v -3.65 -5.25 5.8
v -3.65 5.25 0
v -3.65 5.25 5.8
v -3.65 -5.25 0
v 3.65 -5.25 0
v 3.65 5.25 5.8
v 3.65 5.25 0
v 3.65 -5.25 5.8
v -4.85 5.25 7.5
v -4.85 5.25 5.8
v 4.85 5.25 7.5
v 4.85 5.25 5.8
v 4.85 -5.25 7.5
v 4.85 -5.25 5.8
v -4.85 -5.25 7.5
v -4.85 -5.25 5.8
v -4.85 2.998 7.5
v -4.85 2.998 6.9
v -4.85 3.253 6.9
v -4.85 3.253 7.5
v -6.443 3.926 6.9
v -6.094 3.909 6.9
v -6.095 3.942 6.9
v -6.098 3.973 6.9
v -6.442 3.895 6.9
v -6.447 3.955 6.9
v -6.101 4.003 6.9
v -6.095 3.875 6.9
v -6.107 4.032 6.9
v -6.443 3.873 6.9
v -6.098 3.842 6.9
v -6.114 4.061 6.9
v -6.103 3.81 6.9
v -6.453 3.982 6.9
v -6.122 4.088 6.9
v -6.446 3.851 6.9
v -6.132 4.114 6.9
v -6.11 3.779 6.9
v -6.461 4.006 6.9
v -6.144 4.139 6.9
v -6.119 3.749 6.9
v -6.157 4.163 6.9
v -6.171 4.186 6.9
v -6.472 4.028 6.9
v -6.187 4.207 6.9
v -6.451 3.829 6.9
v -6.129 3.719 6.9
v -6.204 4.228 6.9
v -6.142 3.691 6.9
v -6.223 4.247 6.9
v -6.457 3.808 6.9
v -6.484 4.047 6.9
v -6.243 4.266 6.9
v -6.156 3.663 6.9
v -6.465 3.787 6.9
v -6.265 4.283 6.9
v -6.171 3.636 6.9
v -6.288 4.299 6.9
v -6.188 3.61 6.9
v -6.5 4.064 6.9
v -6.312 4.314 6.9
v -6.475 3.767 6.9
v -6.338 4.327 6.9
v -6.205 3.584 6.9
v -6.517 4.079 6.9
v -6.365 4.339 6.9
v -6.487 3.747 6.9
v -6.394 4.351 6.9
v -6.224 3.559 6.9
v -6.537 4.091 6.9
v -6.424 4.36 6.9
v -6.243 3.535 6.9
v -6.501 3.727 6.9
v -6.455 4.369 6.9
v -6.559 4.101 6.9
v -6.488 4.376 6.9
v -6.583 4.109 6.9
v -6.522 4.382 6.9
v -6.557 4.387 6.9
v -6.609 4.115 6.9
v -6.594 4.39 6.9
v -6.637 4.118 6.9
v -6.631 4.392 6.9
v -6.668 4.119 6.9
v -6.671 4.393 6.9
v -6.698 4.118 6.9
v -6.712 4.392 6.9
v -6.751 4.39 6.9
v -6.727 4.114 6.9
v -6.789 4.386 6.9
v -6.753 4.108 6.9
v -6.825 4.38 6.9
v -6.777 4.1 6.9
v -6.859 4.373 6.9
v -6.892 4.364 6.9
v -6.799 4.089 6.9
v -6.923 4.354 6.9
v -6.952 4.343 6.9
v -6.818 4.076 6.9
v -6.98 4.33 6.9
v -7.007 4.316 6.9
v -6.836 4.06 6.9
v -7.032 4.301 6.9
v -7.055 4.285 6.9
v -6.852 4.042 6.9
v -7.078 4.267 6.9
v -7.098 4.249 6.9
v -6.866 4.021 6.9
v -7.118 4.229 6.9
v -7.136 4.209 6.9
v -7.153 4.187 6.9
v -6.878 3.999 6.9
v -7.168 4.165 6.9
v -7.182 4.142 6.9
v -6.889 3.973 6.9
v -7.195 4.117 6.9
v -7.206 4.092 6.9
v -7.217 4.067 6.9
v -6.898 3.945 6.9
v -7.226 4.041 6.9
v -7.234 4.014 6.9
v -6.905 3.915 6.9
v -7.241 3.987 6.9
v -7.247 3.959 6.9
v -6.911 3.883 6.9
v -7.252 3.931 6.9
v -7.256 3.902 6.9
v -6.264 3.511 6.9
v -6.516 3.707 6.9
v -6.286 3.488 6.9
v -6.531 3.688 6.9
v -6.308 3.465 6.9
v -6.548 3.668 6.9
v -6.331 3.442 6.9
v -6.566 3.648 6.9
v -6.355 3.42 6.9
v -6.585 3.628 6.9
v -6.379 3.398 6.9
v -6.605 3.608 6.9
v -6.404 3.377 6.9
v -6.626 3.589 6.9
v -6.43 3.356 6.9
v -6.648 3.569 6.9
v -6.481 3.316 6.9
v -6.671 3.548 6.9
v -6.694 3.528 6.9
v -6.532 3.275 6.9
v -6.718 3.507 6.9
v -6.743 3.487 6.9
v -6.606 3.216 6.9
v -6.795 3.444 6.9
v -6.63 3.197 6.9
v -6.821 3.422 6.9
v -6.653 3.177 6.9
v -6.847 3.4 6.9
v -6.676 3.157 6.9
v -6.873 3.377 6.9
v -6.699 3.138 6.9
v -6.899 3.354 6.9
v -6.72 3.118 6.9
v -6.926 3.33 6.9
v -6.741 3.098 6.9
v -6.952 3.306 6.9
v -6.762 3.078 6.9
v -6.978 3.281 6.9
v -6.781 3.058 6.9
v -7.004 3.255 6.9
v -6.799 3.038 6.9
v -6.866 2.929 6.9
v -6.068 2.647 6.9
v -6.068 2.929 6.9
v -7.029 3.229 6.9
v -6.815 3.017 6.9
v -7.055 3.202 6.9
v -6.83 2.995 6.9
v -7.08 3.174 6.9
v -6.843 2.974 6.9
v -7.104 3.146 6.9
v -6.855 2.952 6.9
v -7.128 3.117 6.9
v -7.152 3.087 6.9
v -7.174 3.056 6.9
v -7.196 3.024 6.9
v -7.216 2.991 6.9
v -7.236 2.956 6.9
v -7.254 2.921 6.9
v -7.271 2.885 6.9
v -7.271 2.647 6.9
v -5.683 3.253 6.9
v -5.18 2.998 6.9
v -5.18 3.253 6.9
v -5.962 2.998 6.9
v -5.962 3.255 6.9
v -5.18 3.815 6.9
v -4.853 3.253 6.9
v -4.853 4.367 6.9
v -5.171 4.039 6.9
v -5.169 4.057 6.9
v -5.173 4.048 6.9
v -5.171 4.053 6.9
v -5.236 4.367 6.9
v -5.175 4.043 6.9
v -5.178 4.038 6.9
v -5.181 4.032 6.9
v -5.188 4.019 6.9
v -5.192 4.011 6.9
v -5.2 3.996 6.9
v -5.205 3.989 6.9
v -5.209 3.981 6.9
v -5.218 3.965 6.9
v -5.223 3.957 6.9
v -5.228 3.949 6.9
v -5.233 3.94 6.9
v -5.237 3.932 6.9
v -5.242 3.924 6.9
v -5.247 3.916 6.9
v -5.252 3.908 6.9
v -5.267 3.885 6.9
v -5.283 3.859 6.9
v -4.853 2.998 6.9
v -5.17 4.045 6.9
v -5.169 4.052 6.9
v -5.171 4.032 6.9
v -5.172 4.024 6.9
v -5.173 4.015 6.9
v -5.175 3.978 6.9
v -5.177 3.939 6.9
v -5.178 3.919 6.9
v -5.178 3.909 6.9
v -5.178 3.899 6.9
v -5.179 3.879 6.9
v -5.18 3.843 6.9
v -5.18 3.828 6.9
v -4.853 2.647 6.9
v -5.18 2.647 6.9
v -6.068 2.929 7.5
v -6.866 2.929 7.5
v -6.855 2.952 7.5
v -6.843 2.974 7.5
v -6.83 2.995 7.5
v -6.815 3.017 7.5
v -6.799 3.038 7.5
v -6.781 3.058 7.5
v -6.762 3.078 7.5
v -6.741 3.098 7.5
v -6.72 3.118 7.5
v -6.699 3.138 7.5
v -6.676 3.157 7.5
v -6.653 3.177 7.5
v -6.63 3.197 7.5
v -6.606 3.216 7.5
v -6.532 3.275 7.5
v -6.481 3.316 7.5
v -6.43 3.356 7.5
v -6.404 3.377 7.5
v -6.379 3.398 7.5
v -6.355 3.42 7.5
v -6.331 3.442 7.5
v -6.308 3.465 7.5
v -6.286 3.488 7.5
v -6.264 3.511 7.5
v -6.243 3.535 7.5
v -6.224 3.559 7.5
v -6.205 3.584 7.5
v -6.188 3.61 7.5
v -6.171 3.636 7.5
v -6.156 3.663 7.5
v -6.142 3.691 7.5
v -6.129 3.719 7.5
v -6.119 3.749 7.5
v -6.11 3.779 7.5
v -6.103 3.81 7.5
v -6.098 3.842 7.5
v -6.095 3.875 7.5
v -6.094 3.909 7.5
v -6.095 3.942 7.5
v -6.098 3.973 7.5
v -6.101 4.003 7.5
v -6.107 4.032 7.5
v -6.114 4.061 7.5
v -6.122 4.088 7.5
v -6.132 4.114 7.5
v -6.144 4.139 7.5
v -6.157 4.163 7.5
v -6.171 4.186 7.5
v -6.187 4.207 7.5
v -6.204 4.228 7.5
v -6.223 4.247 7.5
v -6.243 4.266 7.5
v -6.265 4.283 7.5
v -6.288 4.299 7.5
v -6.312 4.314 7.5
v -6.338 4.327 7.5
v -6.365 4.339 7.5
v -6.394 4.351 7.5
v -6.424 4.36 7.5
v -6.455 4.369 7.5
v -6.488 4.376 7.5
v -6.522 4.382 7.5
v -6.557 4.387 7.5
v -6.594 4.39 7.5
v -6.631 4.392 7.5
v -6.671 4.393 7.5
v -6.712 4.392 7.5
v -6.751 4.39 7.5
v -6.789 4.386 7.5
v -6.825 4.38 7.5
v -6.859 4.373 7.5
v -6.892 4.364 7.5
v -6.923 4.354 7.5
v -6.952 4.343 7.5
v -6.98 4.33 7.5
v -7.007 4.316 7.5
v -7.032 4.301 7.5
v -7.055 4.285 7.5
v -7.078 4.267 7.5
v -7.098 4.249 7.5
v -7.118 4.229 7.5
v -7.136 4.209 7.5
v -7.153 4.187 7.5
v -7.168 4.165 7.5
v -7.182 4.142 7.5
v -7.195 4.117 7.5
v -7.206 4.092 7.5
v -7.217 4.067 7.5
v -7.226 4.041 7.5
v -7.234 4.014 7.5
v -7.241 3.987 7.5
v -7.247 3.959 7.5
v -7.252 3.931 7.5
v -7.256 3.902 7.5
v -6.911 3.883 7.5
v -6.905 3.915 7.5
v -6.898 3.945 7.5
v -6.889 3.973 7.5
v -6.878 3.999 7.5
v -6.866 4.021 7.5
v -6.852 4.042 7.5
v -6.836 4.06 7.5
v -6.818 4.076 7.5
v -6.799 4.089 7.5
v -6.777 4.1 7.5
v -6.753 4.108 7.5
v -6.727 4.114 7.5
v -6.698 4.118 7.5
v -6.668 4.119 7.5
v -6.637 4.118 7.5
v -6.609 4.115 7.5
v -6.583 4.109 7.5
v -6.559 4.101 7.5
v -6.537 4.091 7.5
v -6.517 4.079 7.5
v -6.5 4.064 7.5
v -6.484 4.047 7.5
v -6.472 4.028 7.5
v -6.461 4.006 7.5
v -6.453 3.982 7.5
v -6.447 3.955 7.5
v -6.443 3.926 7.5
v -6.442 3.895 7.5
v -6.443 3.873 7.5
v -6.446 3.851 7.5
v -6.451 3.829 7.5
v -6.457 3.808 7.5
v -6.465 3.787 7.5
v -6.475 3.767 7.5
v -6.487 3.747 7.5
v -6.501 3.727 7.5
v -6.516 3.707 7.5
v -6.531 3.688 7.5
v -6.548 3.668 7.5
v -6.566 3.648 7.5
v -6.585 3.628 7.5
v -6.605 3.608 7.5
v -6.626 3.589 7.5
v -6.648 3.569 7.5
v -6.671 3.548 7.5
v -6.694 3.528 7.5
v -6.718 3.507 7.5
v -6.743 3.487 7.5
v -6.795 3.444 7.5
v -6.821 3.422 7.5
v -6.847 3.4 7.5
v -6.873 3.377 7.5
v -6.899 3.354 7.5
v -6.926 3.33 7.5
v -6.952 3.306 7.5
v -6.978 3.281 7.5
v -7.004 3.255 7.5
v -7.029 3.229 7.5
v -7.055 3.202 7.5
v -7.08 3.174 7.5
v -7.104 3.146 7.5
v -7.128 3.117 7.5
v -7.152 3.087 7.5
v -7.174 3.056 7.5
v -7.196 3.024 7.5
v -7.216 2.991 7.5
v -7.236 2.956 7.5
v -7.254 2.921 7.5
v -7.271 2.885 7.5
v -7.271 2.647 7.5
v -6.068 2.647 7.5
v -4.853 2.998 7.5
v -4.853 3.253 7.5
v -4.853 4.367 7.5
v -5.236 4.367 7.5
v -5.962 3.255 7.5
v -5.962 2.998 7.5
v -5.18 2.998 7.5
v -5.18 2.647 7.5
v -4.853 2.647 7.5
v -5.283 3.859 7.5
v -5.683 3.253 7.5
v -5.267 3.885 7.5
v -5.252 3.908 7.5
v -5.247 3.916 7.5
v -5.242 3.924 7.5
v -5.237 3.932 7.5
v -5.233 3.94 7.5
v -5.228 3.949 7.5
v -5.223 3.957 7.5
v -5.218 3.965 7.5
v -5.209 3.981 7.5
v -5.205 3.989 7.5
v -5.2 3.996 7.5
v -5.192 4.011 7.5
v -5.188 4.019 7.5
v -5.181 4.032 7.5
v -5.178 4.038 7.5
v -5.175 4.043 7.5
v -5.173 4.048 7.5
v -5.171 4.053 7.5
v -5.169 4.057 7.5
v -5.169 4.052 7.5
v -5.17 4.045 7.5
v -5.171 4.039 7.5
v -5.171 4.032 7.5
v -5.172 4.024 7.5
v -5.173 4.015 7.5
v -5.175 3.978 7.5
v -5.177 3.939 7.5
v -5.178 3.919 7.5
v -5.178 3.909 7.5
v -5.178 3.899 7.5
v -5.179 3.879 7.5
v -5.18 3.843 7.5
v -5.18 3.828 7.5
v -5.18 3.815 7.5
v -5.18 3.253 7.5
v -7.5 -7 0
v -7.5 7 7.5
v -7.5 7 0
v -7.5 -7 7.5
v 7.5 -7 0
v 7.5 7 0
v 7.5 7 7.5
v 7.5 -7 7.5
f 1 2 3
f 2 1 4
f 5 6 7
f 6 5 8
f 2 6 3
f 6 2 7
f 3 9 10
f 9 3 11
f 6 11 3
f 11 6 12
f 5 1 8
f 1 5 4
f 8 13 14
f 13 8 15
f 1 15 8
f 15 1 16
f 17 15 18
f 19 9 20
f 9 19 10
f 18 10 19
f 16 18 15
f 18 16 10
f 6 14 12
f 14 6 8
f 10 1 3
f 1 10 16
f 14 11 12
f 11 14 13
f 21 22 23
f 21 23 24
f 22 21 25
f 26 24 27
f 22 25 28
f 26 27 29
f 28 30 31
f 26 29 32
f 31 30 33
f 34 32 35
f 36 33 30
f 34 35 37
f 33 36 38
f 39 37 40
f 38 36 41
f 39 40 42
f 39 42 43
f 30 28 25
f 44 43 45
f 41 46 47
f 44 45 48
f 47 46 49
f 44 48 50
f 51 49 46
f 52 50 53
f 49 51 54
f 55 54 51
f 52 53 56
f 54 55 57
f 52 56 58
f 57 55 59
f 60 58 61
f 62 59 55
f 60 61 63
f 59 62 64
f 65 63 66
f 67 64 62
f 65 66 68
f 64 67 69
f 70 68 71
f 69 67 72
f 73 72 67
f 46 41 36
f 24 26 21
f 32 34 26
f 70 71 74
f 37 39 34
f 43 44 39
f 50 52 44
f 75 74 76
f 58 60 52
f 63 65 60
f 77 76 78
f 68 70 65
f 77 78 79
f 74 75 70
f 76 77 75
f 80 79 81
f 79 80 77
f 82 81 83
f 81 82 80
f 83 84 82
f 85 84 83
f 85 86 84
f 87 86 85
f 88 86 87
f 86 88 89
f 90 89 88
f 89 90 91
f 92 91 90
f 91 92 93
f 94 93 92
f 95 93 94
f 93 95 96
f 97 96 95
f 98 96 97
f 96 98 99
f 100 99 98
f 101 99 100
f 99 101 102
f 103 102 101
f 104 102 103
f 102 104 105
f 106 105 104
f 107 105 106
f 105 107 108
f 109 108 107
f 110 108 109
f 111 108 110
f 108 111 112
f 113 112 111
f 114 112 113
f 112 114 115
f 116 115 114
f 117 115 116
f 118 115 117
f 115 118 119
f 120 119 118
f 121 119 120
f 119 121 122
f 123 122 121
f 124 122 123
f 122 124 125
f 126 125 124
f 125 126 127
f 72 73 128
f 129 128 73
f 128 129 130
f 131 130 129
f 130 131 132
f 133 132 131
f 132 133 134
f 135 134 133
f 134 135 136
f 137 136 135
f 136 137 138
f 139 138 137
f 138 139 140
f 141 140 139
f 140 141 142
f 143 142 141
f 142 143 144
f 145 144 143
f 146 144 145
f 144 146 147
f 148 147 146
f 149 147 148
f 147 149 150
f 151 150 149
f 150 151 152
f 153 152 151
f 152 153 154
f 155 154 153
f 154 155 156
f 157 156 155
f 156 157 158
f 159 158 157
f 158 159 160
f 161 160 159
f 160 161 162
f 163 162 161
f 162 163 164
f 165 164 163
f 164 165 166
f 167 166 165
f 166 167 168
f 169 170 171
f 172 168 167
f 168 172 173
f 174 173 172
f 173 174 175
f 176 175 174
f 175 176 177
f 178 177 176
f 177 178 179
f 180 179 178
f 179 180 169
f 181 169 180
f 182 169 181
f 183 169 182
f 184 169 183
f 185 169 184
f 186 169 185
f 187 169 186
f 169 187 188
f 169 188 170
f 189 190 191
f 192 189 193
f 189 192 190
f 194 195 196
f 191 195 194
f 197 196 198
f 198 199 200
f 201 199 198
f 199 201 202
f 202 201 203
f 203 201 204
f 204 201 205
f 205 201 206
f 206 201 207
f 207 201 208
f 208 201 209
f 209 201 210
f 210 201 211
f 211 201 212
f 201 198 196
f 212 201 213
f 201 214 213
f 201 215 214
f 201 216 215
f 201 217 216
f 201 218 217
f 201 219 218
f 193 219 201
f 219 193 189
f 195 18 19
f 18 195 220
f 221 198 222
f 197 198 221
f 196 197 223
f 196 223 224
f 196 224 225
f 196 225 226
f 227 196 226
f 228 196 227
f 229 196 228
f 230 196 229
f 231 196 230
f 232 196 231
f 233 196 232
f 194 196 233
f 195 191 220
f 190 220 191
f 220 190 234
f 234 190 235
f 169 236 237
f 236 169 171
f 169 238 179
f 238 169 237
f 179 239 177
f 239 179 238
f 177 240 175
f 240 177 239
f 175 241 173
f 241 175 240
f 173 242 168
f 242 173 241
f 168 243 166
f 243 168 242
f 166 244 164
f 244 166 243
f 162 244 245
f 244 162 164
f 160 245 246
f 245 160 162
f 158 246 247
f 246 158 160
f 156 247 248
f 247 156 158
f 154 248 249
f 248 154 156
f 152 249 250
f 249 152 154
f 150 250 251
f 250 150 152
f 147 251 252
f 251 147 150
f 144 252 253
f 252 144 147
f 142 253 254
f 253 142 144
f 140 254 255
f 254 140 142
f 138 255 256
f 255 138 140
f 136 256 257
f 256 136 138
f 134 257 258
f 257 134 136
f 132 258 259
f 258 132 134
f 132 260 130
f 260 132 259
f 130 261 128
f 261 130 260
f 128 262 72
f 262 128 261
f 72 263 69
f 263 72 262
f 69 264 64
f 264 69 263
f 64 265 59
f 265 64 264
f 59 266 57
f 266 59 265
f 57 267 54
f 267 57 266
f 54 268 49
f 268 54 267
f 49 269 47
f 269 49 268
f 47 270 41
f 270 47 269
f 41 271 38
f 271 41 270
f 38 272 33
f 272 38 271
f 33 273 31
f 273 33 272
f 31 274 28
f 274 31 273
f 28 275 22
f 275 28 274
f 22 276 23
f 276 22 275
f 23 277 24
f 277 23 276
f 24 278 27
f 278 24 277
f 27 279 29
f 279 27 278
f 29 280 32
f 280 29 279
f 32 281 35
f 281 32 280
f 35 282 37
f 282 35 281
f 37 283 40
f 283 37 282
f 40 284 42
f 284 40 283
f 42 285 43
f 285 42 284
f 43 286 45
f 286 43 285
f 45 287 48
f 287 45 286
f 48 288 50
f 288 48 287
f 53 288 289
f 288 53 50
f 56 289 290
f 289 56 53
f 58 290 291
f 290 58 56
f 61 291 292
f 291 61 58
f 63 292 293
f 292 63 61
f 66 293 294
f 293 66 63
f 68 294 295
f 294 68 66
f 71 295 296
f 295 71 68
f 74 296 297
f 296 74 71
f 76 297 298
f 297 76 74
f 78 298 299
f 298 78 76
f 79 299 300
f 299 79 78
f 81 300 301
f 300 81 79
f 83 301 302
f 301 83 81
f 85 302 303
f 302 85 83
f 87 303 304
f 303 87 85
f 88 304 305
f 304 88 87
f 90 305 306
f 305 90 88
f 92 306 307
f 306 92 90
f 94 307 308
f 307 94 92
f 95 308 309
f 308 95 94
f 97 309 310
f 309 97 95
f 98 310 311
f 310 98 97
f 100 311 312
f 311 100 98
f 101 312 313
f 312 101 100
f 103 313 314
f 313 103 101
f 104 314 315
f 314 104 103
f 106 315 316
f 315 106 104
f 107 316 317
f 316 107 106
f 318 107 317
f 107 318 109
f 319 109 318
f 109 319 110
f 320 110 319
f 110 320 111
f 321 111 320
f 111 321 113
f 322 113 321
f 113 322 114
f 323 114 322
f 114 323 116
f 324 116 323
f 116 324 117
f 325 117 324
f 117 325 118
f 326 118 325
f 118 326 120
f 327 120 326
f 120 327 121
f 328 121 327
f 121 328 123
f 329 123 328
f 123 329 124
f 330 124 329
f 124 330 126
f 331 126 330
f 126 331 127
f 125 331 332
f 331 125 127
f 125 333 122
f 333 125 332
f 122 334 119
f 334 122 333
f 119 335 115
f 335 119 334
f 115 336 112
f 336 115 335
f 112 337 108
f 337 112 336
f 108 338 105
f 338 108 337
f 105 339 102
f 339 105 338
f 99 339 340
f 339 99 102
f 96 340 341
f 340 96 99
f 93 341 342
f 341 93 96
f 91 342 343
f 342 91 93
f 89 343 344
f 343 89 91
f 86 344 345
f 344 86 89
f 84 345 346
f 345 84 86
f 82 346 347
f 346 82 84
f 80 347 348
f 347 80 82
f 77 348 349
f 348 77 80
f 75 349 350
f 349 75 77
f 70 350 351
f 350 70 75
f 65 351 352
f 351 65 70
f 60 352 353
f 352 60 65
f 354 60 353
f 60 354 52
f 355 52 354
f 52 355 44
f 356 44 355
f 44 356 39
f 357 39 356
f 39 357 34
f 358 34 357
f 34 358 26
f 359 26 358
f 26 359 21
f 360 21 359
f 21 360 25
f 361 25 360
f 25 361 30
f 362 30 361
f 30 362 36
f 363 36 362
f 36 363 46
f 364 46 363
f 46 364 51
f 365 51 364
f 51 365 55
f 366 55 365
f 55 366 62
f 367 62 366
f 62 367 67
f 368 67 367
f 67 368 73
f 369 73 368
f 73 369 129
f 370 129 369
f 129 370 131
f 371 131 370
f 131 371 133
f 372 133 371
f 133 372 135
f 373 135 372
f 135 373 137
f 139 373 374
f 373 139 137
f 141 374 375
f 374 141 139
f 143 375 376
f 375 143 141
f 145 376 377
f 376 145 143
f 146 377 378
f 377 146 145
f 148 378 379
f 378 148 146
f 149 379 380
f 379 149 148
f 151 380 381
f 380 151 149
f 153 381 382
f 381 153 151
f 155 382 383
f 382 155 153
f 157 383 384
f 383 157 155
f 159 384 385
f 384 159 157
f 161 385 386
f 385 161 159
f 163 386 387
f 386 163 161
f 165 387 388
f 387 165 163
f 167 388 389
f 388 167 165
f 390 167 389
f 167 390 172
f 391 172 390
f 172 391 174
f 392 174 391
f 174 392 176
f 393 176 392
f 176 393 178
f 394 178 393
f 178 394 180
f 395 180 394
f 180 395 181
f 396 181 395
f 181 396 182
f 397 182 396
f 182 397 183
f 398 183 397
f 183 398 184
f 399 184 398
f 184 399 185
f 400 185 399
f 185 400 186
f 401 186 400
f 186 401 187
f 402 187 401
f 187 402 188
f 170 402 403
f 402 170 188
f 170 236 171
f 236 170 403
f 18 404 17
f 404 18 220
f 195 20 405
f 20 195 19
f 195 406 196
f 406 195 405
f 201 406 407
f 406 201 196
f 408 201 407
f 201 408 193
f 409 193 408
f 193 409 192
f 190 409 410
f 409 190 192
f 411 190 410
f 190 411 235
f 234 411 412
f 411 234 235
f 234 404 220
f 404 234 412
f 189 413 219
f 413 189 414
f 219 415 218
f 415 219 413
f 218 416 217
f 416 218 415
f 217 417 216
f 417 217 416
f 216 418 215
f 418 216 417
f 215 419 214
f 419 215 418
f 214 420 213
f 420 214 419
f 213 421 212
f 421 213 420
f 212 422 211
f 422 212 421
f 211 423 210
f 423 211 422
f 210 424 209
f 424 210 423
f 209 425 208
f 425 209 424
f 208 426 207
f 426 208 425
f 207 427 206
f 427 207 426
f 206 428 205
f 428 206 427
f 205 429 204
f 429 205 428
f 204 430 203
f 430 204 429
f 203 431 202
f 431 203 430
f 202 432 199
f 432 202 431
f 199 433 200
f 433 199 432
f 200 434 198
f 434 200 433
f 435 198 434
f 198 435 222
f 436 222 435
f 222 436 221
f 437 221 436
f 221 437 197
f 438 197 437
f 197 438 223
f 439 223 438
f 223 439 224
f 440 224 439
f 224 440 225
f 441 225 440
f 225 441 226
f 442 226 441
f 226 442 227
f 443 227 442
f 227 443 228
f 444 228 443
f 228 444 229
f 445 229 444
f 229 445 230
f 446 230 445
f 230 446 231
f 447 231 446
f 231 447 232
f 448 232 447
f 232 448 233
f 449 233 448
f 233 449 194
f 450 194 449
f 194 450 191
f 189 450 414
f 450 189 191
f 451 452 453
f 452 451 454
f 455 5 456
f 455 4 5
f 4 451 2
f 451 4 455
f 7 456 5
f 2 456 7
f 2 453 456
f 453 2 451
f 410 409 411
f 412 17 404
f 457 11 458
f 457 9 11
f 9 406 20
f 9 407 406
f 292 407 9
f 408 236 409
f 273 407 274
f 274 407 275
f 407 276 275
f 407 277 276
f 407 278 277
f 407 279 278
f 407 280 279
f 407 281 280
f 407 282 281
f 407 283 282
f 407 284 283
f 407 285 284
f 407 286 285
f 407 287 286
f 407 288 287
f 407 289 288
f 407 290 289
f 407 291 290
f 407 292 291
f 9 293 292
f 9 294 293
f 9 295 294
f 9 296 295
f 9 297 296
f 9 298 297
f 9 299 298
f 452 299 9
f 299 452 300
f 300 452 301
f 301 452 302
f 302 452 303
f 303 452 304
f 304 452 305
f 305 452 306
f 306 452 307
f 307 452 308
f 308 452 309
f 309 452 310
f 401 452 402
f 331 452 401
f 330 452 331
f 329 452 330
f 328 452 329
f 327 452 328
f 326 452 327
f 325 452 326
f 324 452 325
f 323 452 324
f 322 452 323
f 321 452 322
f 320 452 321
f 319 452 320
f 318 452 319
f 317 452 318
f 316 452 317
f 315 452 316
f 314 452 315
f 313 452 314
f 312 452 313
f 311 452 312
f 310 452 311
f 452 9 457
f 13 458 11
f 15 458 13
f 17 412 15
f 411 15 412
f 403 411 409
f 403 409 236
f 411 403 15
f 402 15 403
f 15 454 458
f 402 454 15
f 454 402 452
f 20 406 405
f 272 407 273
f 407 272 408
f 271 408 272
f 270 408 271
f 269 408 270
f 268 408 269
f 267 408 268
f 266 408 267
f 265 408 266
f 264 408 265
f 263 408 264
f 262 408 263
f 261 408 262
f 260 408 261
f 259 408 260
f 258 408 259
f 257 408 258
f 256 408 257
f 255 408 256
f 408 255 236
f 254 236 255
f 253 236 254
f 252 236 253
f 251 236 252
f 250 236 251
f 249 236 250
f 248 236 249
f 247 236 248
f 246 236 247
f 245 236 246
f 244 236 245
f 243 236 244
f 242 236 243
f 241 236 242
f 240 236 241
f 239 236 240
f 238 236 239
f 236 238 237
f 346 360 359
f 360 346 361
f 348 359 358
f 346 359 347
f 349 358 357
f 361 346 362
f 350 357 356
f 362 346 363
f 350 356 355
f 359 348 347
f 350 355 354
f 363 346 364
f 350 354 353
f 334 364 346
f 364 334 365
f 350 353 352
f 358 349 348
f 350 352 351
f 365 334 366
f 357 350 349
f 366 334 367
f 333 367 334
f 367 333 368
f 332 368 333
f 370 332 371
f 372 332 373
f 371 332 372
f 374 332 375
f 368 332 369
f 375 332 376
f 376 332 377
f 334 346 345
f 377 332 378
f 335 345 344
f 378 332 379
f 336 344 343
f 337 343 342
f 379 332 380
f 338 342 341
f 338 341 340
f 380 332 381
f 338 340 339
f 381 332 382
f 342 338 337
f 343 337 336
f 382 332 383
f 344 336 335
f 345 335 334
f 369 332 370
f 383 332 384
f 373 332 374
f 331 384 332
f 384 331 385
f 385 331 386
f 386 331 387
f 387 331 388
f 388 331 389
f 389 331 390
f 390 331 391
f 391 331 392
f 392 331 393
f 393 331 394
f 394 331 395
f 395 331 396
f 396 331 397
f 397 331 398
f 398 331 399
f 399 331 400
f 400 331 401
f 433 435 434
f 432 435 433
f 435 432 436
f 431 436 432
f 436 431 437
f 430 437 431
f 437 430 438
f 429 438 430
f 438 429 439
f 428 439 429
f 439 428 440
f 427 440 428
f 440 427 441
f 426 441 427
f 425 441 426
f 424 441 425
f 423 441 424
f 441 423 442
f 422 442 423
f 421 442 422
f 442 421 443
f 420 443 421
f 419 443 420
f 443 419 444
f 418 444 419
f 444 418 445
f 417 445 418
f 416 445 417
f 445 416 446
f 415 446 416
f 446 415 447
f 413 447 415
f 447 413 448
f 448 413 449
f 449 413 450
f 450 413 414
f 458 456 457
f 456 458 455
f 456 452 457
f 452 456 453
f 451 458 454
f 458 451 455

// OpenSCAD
$fn = 50;

difference() {
	union() {
		translate(v = [0, -5, 7.5]) {
			rotate(a = [0, 180, 0]) {
				difference() {
					union() {
						translate(v = [-7.5, -2.0, 0]) {
							cube(size = [15.0, 14.0, 7.5]);
						}
					}
					union() {
						translate(v = [-3.65, -0.25, -0.1]) {
							cube(size = [7.3, 10.5, 7.7]);
						}
						translate(v = [-4.85, -0.25, -0.1]) {
							cube(size = [9.7, 10.5, 1.8]);
						}
						translate(v = [6, 8.5, 0.6]) {
							rotate(a = [0, 180, 0]) {
								linear_extrude(height = 0.7) {
									text(font = "Arial:style=Bold", halign = "center", size = 1.8, text = "24", valign = "center");
								}
							}
						}
					}
				}
			}
		}
	}
	union();
}
